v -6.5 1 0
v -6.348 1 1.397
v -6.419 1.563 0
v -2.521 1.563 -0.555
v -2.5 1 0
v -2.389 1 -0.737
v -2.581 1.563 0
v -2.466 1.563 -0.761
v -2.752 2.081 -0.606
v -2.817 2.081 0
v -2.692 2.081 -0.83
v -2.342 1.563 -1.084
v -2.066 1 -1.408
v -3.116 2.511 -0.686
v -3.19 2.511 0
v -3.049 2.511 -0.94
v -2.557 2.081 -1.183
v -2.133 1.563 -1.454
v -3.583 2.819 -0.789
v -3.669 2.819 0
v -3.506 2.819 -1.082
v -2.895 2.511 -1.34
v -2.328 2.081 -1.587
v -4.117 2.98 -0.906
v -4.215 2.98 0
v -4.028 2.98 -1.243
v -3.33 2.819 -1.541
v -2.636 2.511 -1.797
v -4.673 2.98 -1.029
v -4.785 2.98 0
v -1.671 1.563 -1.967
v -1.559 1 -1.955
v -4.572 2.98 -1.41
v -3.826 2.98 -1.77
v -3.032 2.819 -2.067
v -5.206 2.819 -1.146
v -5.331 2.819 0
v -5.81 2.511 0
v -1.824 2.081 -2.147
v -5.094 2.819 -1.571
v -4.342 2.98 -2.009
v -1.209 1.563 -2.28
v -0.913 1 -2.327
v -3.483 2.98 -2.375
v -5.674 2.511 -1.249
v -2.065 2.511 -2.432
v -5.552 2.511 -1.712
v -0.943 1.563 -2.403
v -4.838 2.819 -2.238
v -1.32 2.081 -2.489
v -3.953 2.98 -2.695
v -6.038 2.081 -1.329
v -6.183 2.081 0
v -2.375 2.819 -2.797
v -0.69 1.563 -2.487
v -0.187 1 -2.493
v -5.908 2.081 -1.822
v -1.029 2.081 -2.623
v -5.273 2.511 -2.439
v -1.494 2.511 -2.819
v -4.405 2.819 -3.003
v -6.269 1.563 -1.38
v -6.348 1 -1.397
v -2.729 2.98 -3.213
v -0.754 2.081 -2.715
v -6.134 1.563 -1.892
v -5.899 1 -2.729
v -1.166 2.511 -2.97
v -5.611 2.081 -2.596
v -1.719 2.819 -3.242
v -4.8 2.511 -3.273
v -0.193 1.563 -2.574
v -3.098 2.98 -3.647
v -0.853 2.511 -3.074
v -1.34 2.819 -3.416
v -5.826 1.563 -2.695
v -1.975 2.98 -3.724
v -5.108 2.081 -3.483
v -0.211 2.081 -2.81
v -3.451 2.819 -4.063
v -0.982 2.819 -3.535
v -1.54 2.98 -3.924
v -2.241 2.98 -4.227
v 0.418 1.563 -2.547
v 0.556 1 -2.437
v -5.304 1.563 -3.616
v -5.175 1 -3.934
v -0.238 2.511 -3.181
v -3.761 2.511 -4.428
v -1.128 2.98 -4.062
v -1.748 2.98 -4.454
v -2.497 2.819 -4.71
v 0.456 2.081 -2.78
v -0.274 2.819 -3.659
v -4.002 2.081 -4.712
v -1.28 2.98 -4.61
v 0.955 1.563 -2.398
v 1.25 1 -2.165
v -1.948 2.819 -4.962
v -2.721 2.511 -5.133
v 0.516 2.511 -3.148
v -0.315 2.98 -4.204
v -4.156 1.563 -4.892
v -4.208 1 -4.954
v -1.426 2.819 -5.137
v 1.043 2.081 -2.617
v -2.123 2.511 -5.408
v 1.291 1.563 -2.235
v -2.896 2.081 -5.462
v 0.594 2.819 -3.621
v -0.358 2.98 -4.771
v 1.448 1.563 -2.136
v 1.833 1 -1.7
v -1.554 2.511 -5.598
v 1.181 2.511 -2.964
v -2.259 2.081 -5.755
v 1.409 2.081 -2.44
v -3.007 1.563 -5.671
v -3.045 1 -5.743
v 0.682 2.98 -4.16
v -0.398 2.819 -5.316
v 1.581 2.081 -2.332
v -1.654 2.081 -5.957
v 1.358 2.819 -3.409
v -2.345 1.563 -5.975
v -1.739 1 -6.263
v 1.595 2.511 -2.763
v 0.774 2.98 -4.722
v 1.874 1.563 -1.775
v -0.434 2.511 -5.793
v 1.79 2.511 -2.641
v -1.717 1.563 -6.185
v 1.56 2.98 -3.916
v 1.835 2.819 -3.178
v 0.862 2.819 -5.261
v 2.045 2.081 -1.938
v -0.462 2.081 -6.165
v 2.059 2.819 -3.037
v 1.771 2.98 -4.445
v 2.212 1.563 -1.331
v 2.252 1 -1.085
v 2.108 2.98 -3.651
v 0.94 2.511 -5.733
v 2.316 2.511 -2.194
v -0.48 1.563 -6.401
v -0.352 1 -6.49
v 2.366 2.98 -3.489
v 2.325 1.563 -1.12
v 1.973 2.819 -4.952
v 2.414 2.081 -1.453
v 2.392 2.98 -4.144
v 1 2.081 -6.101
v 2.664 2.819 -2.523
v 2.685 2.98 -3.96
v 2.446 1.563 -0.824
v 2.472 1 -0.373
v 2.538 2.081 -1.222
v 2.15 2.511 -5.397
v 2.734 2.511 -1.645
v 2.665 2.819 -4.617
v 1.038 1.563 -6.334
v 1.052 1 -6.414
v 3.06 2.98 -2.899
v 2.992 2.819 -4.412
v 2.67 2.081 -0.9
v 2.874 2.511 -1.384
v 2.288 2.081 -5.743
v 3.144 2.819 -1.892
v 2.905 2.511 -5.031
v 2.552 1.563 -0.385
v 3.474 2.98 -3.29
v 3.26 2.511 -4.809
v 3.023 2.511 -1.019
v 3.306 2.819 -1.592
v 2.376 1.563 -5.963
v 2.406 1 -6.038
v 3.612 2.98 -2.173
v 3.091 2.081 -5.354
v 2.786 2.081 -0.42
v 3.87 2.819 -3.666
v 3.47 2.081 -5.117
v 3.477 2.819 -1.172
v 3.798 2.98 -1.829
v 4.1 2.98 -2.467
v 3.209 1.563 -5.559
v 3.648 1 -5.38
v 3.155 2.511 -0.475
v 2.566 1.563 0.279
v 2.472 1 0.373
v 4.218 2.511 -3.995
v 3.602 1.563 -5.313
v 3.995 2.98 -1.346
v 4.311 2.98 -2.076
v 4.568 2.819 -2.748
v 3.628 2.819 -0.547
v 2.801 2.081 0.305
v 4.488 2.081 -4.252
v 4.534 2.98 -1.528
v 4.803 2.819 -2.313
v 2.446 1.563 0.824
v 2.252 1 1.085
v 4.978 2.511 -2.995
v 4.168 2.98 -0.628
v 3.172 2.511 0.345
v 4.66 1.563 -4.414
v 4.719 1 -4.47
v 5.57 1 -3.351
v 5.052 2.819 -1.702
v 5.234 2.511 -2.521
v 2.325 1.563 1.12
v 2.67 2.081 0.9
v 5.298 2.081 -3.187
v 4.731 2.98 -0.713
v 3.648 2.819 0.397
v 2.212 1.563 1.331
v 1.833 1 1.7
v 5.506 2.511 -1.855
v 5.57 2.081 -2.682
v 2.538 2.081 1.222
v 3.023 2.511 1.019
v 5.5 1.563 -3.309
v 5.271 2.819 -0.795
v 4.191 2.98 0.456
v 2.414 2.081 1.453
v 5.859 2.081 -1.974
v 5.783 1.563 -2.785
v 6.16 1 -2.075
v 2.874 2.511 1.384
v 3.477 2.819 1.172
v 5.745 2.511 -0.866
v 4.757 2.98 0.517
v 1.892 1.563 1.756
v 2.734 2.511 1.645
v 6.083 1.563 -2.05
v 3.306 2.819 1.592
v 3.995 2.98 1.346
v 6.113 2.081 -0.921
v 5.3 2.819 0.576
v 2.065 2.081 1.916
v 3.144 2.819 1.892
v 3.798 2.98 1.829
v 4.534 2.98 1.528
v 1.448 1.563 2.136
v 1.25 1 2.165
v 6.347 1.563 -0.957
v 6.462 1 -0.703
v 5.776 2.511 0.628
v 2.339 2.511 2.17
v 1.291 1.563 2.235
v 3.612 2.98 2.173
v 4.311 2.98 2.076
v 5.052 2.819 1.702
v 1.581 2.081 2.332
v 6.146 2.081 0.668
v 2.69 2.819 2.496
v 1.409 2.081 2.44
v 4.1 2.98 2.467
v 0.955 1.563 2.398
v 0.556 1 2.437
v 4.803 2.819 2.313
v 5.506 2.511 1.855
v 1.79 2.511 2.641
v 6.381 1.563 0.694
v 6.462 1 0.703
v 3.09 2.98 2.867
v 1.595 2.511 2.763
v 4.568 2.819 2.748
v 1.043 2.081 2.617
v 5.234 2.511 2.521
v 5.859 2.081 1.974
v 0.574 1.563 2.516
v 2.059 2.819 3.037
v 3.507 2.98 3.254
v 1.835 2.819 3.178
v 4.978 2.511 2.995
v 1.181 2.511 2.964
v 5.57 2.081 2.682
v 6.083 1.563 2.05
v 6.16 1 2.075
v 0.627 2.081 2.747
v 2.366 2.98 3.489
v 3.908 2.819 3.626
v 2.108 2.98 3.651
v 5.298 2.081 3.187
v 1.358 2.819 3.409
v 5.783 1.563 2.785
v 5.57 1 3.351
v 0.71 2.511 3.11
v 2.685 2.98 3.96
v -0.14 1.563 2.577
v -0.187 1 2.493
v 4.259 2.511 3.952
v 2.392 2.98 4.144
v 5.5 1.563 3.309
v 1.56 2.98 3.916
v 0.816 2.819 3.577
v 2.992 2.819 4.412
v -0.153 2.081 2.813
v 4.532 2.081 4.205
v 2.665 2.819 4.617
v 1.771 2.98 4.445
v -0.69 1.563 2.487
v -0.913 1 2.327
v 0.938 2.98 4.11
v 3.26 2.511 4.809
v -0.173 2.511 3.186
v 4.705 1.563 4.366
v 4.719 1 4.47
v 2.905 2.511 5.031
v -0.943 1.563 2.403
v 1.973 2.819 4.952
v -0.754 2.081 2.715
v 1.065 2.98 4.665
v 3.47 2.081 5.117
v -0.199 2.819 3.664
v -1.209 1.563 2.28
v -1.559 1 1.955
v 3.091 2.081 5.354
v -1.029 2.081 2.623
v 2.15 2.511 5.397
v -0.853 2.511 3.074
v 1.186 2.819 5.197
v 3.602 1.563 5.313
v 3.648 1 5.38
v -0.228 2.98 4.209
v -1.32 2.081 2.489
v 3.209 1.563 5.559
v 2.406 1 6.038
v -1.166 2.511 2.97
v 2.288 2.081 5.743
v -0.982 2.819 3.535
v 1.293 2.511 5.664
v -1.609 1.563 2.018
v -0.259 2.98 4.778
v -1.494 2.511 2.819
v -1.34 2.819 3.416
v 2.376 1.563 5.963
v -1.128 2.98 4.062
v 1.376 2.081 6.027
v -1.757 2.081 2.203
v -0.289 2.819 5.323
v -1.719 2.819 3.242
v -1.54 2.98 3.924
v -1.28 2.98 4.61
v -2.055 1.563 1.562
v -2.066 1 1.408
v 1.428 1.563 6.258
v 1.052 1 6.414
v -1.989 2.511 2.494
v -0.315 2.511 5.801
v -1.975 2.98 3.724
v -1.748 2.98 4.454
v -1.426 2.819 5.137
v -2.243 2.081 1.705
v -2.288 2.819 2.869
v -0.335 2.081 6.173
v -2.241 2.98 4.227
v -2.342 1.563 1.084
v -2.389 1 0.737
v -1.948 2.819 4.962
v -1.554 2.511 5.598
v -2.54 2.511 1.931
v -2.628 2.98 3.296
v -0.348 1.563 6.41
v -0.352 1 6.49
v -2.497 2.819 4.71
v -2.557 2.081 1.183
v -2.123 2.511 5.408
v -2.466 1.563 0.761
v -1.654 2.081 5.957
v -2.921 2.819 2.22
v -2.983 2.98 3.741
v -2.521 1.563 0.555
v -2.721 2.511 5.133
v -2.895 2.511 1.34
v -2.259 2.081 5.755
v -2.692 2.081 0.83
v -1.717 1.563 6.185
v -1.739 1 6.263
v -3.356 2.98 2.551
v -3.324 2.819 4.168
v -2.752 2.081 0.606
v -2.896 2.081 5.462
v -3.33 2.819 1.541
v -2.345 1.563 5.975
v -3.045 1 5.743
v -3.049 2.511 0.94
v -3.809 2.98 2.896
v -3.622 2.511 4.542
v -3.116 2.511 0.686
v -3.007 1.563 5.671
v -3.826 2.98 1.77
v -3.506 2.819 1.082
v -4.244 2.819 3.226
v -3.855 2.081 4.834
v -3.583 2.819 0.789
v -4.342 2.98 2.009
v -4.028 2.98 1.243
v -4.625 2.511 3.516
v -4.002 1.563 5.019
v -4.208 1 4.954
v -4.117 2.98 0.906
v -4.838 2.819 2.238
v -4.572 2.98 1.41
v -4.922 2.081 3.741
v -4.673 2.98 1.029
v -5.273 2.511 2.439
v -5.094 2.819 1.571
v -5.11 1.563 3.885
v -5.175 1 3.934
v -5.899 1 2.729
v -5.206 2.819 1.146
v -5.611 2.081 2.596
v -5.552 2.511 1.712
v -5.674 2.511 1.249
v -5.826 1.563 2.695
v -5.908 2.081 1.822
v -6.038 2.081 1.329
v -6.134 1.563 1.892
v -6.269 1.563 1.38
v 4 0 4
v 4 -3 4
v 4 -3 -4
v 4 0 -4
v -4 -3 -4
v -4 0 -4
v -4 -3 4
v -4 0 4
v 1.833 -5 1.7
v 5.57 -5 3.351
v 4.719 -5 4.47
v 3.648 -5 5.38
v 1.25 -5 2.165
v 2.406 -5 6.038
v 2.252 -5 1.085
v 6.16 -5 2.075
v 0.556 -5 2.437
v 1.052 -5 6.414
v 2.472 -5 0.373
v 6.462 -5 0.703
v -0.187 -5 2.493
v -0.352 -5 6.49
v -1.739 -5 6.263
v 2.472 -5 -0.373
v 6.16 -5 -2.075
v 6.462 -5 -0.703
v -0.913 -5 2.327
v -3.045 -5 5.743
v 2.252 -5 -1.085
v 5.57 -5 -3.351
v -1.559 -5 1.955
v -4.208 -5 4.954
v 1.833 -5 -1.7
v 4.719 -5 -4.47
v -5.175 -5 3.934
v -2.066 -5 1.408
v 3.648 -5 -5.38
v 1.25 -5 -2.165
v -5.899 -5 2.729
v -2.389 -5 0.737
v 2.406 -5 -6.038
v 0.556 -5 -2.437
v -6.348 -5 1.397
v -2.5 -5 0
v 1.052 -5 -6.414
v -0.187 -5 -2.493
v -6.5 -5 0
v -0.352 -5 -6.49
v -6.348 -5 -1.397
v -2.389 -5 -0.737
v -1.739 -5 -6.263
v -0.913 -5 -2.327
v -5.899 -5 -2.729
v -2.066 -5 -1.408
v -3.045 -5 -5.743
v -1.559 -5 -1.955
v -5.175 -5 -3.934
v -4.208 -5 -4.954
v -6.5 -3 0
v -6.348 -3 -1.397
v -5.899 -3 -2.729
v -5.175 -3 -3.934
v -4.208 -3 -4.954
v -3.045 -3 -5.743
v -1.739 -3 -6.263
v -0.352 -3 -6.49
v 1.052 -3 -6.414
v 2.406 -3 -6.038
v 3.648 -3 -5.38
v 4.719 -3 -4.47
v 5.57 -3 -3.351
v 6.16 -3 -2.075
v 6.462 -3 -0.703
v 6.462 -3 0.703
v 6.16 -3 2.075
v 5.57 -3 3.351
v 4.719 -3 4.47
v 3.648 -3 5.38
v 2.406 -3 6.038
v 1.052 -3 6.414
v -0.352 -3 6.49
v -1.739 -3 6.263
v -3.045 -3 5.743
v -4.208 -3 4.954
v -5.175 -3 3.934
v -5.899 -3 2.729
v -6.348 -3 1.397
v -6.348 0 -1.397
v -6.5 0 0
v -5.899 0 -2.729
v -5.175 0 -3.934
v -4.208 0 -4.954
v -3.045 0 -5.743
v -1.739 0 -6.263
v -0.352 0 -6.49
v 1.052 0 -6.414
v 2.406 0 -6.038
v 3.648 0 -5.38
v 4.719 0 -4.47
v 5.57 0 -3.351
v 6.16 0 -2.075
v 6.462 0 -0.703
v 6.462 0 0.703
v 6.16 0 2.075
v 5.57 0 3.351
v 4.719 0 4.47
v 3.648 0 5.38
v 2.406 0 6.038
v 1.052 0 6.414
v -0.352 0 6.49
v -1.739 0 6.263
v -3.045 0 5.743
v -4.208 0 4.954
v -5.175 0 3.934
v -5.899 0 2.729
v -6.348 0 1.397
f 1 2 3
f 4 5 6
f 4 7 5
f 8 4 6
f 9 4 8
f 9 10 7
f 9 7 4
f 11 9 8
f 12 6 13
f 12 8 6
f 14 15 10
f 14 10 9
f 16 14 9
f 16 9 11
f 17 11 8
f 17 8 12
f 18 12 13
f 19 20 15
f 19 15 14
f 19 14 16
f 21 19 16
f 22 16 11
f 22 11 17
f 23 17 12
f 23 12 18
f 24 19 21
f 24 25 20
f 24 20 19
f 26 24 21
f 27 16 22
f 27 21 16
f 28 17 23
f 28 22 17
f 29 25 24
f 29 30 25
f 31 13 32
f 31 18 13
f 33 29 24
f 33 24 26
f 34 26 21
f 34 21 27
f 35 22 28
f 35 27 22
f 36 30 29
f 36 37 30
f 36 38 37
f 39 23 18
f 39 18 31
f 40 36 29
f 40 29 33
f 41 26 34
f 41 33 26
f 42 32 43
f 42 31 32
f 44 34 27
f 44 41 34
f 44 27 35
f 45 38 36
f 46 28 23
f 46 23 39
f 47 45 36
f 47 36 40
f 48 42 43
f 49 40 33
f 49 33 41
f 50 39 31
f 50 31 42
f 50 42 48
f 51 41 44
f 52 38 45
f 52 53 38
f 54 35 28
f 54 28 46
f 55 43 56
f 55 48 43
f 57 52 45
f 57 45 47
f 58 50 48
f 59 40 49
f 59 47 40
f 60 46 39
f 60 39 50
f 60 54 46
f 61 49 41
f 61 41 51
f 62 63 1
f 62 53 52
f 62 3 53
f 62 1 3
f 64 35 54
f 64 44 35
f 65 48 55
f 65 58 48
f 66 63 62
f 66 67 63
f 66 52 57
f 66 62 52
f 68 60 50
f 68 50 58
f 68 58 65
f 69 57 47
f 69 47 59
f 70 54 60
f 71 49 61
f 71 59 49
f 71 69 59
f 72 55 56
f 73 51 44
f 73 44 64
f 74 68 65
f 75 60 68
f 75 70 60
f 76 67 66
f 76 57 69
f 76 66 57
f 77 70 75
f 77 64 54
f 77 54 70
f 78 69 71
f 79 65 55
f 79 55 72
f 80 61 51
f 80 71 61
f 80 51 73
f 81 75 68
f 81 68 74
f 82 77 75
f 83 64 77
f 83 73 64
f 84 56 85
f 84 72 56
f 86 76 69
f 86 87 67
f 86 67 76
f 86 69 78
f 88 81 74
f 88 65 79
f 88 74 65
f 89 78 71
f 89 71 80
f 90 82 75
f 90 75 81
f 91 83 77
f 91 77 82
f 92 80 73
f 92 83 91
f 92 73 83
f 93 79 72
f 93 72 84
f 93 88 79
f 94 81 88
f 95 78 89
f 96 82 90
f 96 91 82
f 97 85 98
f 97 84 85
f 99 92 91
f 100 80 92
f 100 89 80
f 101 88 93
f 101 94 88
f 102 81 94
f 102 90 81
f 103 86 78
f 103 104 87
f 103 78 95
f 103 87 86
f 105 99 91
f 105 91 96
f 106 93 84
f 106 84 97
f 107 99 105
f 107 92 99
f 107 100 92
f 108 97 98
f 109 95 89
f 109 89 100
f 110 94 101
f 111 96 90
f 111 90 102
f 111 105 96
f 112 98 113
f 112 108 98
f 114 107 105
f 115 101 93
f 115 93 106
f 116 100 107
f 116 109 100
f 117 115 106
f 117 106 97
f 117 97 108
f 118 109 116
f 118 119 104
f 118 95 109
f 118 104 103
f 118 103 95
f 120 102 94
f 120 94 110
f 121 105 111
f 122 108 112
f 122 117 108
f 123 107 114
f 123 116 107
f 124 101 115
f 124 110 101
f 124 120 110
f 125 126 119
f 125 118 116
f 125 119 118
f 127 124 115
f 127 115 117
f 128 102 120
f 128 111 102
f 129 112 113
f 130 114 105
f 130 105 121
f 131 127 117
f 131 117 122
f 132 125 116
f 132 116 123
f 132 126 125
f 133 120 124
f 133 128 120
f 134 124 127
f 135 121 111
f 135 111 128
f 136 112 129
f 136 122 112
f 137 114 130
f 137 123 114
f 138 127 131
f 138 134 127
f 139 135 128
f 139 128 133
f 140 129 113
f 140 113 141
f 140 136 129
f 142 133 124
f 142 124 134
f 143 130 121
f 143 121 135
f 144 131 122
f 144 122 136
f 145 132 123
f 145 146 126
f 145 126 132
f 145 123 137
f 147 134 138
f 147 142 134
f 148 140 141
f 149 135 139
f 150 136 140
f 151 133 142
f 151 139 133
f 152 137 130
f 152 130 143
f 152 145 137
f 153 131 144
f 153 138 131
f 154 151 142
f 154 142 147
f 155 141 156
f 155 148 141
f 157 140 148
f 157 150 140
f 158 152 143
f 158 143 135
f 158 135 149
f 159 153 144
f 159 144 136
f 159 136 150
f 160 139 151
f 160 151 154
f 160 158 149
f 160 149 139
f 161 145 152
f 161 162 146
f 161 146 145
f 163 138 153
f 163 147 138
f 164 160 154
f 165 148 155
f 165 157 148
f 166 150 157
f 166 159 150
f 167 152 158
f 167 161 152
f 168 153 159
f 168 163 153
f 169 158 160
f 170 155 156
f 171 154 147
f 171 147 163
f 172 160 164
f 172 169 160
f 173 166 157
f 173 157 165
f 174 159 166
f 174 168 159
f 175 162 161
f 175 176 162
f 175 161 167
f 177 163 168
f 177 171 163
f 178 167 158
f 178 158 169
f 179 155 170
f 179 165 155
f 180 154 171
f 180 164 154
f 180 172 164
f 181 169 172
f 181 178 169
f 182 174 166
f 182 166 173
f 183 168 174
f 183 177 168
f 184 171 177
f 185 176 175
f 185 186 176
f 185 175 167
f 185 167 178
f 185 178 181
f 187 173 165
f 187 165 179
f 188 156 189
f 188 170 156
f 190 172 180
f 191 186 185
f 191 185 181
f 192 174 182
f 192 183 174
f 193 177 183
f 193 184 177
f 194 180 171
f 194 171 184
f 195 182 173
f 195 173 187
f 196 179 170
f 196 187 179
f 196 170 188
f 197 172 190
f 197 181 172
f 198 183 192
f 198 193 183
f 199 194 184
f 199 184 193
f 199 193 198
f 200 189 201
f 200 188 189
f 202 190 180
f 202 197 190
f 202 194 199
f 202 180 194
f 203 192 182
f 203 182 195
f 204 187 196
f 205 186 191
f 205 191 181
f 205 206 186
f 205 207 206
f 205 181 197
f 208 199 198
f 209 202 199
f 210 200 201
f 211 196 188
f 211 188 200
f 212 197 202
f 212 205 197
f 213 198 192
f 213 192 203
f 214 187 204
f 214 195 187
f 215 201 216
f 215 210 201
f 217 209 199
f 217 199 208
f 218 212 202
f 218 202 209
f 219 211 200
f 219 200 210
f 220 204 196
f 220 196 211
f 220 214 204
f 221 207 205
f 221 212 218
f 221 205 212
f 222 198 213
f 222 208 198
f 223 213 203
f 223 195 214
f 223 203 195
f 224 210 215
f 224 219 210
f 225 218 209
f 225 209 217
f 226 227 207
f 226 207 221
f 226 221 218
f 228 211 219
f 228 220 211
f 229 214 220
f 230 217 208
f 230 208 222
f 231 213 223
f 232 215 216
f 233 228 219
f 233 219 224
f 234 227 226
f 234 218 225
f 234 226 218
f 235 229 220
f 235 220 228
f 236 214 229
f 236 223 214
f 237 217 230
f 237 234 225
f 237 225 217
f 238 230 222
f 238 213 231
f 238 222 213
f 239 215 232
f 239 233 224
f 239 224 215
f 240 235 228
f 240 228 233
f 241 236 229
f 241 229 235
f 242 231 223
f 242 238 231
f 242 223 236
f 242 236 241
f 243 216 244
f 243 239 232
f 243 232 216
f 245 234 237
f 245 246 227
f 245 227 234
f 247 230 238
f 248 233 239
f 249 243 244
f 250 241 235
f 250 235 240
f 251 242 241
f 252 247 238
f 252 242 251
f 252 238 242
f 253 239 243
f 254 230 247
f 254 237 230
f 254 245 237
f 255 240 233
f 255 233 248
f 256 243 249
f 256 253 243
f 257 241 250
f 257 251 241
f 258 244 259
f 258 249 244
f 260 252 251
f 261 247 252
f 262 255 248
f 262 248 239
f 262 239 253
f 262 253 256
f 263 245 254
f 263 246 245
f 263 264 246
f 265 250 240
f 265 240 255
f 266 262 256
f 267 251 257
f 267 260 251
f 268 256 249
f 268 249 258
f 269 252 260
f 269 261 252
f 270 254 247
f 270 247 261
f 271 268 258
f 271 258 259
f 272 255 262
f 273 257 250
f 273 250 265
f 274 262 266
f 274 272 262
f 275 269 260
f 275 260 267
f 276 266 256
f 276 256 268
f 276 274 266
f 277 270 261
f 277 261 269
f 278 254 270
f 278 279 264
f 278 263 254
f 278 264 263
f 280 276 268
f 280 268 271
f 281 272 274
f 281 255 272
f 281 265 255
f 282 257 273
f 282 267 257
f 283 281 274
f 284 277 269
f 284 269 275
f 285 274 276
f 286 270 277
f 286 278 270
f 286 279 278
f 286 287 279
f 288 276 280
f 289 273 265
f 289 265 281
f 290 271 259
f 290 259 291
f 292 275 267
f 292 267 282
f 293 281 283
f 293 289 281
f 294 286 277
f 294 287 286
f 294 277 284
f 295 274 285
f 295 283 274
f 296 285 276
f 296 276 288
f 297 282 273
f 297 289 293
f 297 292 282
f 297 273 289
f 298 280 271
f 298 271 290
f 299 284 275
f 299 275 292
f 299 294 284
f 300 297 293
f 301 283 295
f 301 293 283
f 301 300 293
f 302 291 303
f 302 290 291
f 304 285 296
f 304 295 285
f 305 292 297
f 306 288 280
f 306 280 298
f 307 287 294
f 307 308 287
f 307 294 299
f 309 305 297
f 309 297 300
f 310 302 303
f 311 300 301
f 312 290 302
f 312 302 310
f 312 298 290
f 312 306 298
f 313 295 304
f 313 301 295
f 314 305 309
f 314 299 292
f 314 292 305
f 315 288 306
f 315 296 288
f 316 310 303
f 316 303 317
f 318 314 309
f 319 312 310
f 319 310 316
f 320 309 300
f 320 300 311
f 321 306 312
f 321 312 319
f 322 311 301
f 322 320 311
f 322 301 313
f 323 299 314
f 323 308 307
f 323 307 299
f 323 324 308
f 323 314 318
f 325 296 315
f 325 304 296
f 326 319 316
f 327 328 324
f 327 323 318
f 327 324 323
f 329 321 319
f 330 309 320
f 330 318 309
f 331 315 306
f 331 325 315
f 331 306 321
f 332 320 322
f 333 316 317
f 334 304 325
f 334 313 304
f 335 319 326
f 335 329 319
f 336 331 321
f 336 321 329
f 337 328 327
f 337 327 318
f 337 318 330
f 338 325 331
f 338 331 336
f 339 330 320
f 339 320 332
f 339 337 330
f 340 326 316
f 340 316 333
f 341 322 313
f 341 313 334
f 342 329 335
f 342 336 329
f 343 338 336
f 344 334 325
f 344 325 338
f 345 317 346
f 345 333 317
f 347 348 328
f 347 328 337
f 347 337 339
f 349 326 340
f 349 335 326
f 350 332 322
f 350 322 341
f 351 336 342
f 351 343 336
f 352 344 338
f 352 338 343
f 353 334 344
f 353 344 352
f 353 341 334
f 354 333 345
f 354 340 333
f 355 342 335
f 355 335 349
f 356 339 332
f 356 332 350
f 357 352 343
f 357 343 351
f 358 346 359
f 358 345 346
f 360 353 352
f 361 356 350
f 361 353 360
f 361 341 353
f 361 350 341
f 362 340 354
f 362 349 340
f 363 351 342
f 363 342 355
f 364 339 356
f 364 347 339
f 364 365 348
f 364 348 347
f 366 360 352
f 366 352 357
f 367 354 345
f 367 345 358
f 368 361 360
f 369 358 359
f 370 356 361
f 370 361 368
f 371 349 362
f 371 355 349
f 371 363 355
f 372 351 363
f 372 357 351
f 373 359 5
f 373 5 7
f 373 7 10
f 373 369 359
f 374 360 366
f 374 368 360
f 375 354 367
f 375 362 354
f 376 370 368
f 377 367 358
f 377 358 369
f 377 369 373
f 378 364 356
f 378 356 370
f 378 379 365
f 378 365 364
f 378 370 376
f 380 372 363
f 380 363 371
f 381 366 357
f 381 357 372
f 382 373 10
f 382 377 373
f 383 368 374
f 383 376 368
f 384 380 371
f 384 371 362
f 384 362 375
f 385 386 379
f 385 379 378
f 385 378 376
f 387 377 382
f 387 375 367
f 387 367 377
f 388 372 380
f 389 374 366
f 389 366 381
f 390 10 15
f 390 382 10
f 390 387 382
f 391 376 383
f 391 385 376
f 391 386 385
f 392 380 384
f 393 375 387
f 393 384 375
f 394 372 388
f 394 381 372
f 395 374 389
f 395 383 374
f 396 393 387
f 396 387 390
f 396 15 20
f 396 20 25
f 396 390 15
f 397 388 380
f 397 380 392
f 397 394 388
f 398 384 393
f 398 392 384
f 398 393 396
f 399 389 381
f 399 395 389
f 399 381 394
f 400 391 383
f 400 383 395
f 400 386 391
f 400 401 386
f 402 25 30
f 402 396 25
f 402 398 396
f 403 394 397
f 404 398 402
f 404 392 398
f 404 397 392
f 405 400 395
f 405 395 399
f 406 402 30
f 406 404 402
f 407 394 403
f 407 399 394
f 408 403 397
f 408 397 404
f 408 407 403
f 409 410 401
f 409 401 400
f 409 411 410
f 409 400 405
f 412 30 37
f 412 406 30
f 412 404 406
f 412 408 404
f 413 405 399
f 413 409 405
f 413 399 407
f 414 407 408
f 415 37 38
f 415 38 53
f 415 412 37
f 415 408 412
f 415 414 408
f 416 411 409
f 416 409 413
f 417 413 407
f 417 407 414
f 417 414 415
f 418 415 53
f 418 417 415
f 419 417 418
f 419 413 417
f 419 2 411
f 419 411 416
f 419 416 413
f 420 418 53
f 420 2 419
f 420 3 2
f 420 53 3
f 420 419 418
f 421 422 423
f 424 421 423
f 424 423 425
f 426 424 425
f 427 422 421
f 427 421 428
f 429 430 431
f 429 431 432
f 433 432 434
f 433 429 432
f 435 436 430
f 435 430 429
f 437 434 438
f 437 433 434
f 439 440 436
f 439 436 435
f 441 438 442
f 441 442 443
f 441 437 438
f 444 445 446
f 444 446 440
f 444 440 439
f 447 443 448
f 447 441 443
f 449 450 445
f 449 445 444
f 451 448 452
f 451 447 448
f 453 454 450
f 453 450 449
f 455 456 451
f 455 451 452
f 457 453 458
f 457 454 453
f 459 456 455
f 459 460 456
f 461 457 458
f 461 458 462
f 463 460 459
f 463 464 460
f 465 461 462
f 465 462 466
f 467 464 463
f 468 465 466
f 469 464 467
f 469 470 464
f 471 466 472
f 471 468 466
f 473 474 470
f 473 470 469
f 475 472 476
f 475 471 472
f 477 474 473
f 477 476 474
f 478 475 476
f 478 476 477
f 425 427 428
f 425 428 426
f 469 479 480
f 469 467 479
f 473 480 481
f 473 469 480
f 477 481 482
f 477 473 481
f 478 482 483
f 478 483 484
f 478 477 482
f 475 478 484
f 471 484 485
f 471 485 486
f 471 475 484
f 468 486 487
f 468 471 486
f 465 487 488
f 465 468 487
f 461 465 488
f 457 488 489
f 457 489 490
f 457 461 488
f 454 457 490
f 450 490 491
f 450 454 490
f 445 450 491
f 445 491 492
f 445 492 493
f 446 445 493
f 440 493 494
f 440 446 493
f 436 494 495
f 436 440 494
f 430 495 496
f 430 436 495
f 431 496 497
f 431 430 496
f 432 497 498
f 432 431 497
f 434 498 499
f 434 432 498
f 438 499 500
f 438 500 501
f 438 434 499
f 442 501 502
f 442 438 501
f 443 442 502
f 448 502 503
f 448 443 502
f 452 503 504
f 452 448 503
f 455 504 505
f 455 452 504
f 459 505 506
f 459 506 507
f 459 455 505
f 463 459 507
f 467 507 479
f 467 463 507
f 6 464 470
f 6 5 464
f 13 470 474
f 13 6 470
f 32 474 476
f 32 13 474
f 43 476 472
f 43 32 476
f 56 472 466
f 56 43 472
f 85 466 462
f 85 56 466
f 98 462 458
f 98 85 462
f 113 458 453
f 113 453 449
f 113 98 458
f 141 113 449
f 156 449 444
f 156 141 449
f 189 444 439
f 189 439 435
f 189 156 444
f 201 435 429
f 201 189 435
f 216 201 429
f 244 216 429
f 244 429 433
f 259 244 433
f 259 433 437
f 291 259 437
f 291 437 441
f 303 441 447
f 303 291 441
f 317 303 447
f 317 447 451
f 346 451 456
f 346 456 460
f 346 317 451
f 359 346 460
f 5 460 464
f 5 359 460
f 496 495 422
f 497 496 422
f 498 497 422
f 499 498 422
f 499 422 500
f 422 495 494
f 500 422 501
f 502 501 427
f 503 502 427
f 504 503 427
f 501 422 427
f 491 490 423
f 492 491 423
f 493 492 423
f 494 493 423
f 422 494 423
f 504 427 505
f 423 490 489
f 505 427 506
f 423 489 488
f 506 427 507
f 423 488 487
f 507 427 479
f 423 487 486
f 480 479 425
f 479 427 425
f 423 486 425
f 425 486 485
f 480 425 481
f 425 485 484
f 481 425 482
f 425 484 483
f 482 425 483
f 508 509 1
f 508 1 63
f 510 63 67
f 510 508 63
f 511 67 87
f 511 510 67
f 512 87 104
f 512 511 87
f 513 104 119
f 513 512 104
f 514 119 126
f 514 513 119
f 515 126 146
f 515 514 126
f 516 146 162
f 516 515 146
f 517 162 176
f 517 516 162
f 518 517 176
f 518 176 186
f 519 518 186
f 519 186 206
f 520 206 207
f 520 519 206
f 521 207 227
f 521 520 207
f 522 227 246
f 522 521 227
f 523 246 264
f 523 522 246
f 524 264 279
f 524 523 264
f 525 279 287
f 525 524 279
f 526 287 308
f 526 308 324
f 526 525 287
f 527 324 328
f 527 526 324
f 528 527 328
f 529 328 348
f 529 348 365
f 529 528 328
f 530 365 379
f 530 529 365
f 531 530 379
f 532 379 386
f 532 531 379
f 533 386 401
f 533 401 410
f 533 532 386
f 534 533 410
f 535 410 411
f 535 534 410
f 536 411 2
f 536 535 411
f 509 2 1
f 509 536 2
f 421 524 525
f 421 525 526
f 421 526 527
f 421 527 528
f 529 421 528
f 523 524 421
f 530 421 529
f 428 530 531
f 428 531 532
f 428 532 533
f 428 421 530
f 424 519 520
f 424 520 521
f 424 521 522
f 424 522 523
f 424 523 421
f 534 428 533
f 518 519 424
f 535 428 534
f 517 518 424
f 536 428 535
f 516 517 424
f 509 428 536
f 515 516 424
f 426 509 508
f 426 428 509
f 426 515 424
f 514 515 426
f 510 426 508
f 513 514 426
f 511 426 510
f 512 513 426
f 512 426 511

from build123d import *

# Parameters (mm, degrees)
SKETCH3_R          = 6.5
SKETCH3_W          = 8
SKETCH3_H          = 8
CUT_EXTRUDE1_DEPTH = 3


with BuildPart() as part:
    # Sketch1 → Revolve1 (revolve)
    with BuildSketch(Plane.XY):
        with BuildLine():
            Line((-2.5, -5), (-2.5, 1))
            ThreePointArc((-2.5, 1), (-4.5, 3), (-6.5, 1))
            Line((-6.5, 1), (-6.5, -5))
            Line((-6.5, -5), (-2.5, -5))
        make_face()
    revolve(axis=Axis((0, 0, 0), (0, -1, 0)))

    # Sketch3 → Cut-Extrude1 (cut)
    with BuildSketch(Plane(origin=(0, -3, 0), x_dir=(-1, 0, 0), z_dir=(0, -1, 0))):
        Circle(SKETCH3_R)
        Rectangle(SKETCH3_W, SKETCH3_H, mode=Mode.SUBTRACT)
    extrude(amount=-CUT_EXTRUDE1_DEPTH, mode=Mode.SUBTRACT)


solid = part.part
